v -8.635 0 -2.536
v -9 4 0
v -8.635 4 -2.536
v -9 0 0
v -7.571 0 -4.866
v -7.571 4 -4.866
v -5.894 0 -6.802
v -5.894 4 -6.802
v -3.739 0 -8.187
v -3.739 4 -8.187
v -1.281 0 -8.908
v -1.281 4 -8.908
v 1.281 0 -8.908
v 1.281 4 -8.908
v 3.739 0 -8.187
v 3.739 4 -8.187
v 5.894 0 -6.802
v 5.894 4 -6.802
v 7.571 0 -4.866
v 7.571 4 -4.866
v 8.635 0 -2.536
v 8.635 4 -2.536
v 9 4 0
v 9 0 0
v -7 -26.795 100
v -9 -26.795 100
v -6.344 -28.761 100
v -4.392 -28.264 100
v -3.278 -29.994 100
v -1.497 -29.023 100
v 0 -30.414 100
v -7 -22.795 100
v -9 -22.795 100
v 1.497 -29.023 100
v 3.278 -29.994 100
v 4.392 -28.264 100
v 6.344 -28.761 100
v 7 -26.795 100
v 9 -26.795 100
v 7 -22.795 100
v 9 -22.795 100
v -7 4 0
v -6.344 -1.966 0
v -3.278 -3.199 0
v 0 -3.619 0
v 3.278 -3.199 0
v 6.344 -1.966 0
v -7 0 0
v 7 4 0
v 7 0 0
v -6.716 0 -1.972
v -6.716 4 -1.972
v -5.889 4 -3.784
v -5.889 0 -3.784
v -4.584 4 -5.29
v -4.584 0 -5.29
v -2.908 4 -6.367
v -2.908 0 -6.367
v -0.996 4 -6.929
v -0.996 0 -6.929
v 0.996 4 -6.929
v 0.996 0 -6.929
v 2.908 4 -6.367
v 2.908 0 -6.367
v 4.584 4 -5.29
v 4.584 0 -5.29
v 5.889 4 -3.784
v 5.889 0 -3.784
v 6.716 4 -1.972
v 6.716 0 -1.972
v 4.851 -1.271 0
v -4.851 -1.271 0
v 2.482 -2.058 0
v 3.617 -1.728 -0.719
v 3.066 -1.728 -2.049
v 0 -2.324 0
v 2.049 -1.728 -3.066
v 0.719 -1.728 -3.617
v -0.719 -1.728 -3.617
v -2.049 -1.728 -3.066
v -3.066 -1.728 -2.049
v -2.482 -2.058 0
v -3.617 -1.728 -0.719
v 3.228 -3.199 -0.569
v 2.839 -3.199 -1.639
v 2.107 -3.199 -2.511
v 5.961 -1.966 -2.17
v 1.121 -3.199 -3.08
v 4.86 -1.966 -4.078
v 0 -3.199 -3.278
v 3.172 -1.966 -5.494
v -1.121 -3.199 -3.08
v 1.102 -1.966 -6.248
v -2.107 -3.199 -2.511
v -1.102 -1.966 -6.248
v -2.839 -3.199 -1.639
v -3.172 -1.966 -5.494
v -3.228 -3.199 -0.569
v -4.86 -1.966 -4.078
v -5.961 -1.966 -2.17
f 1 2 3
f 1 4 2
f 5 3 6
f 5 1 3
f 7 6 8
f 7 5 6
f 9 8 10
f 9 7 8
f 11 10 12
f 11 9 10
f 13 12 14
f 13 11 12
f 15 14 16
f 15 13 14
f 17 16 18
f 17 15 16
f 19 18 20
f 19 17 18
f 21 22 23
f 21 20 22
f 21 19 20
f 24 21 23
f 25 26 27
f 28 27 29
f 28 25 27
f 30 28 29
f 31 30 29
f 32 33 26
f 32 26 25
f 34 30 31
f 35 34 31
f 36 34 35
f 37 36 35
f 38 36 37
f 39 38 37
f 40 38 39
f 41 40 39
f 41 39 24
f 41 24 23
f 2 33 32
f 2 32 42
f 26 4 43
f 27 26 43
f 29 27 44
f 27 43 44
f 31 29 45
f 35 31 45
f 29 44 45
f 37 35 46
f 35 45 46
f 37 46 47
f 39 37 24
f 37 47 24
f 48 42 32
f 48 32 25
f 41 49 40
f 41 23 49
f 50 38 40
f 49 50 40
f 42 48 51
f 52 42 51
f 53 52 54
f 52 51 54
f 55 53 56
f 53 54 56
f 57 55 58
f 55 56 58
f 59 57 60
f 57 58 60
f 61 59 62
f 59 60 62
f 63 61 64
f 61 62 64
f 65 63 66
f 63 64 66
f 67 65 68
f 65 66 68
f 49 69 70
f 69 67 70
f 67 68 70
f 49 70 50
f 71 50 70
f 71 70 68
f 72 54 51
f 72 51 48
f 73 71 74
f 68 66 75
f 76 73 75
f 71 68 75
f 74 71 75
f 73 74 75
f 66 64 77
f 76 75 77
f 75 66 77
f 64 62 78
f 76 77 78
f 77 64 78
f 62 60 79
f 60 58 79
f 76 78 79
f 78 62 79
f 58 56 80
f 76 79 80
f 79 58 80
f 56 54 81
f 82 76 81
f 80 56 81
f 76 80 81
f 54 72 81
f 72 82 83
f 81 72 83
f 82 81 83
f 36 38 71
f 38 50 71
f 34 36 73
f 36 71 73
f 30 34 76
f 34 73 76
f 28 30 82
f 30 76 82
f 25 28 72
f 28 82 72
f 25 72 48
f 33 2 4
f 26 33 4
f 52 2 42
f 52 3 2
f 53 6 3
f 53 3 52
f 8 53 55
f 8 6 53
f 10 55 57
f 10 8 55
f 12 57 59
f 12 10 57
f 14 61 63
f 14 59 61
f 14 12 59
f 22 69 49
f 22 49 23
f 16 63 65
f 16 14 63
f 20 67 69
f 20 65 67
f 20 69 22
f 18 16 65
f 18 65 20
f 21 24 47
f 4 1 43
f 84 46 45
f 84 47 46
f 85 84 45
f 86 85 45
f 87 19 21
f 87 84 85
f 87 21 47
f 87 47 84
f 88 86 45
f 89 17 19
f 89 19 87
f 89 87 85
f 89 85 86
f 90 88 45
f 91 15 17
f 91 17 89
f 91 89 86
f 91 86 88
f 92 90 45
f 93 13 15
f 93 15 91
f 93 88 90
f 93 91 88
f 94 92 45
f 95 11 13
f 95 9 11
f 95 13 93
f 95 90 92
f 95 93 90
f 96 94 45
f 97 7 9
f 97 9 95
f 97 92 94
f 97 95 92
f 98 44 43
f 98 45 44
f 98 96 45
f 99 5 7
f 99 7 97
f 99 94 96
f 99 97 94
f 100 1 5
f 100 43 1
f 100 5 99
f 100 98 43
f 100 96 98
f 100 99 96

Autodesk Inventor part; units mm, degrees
ref_plane "YZ Plane" through (0, 0, 0) normal (1, 0, 0) x (0, 1, 0)
sketch "Esquisse1" plane through (0, 0, 0) normal (0, 1, 0) x (-1, 0, 0)
  line L0 (0, 0) -> (0, 100) construction
  circle A0 centre (0, 0) radius 7 construction
  circle A1 centre (0, 0) radius 9 construction
  arc A2 (-7, 0) -> (7, 0) centre (0, 0) ccw
  arc A3 (-9, 0) -> (9, 0) centre (0, 0) ccw
  line L1 (-9, 0) -> (-7, 0)
  line L2 (7, 0) -> (9, 0)
  line L3 (-7, 0) -> (-7, 2)
  line L4 (-7, 2) -> (-9, 2)
  line L5 (-9, 2) -> (-9, 0)
  line L6 (9, 0) -> (9, 2)
  line L7 (9, 2) -> (7, 2)
  line L8 (7, 2) -> (7, 0)
  dimension "d0" = 100
  dimension "d1" = 14
  dimension "d4" = 18
  dimension "d7" = 2
ref_plane "Plan de construction1" through (9, -26.7949, 100) normal (1, 0, 0) x (0, 1, 0)
sketch "Esquisse3" plane through (9, -26.7949, 100) normal (1, 0, 0) x (0, 1, 0)
  line L0 (0, 0) -> (4, 0)
  line L1 (26.7949, -107) -> (26.7949, -100) projected
  line L2 (26.7949, -100) -> (30.7949, -100)
  line L3 (30.7949, -100) -> (4, 0)
  line L4 (26.7949, -100) -> (0, 0) projected
  line L5 (26.7949, -100) -> (0, 0)
  dimension "d12" = 4
  dimension "d13" = 4
extrude "Extrusion1" add sketch "Esquisse3" against normal blind 2
mirror "Symétrie1" about plane through (0, 0, 0) normal (1, 0, 0) of "Extrusion1"
ref_plane "Plan de construction2" through (7, 0, 0) normal (0, 1, 0) x (1, 0, 0)
sketch "Esquisse4" plane through (7, 0, 0) normal (0, 1, 0) x (1, 0, 0)
  arc A0 (2, 0) -> (-16, 0) centre (-7, 0) ccw projected
  arc A1 (2, 0) -> (-16, 0) centre (-7, 0) ccw
  arc A2 (0, 0) -> (-14, 0) centre (-7, 0) ccw projected
  arc A3 (0, 0) -> (-14, 0) centre (-7, 0) ccw
  line L0 (-14, -100) -> (-14, 0) projected
  line L1 (-14, 0) -> (-16, 0)
  line L2 (0, 0) -> (2, 0)
extrude "Extrusion2" add sketch "Esquisse4" along normal blind 4
sketch "Esquisse5" plane through (9, -26.7949, 100) normal (0, 0, 1) x (1, 0, 0)
  line L0 (0, 0) -> (0, 26.7949) projected
  line L1 (-18, 0) -> (-18, 26.7949) projected
  line L2 (0, 0) -> (-18, 0)
  arc A0 (-18, 0) -> (0, 0) centre (-9, 9.3808) ccw
  line L3 (-16, 26.7949) -> (-16, 0) projected
  line L4 (-2, 26.7949) -> (-2, 0) projected
  arc A1 (-16, 0) -> (-2, 0) centre (-9, 9.3808) ccw
  point P0 (-9, 26.7949)
  dimension "d18" = 13
sketch3d "Esquisse 3D1"
  line L0 (9, -26.7949, 100) -> (9, 0, 0)
sweep "Balayage2" add profiles "Esquisse5" path "Esquisse 3D1" contours A0 L2 A1
sketch "Esquisse6" plane through (0, 0, 0) normal (0, 0, 1) x (1, 0, 0)
  arc A0 (-9, 0) -> (9, 0) centre (0, 9.3808) ccw projected
  line L0 (0, -3.6192) -> (0, -2.3239)
  arc A1 (-7, 0) -> (7, 0) centre (0, 9.3808) ccw projected
  line L1 (9, 0) -> (7, 0) projected
  line L2 (7, 0) -> (9, 0)
  line L3 (-7, 0) -> (7, 0) projected
  arc A2 (0, -2.3239) -> (7, 0) centre (0, 9.3808) ccw
  arc A3 (0, -3.6192) -> (9, 0) centre (0, 9.3808) ccw
  line L4 (0, -7.2643) -> (0, 12.155) projected
  point P0 (0, 0)
revolve "Révolution1" add sketch "Esquisse6" angle 180 about axis through (0, -10, 0) along (0, 1, 0) contours L0 A1 L1 A0
properties part number "TOBOGAN"
